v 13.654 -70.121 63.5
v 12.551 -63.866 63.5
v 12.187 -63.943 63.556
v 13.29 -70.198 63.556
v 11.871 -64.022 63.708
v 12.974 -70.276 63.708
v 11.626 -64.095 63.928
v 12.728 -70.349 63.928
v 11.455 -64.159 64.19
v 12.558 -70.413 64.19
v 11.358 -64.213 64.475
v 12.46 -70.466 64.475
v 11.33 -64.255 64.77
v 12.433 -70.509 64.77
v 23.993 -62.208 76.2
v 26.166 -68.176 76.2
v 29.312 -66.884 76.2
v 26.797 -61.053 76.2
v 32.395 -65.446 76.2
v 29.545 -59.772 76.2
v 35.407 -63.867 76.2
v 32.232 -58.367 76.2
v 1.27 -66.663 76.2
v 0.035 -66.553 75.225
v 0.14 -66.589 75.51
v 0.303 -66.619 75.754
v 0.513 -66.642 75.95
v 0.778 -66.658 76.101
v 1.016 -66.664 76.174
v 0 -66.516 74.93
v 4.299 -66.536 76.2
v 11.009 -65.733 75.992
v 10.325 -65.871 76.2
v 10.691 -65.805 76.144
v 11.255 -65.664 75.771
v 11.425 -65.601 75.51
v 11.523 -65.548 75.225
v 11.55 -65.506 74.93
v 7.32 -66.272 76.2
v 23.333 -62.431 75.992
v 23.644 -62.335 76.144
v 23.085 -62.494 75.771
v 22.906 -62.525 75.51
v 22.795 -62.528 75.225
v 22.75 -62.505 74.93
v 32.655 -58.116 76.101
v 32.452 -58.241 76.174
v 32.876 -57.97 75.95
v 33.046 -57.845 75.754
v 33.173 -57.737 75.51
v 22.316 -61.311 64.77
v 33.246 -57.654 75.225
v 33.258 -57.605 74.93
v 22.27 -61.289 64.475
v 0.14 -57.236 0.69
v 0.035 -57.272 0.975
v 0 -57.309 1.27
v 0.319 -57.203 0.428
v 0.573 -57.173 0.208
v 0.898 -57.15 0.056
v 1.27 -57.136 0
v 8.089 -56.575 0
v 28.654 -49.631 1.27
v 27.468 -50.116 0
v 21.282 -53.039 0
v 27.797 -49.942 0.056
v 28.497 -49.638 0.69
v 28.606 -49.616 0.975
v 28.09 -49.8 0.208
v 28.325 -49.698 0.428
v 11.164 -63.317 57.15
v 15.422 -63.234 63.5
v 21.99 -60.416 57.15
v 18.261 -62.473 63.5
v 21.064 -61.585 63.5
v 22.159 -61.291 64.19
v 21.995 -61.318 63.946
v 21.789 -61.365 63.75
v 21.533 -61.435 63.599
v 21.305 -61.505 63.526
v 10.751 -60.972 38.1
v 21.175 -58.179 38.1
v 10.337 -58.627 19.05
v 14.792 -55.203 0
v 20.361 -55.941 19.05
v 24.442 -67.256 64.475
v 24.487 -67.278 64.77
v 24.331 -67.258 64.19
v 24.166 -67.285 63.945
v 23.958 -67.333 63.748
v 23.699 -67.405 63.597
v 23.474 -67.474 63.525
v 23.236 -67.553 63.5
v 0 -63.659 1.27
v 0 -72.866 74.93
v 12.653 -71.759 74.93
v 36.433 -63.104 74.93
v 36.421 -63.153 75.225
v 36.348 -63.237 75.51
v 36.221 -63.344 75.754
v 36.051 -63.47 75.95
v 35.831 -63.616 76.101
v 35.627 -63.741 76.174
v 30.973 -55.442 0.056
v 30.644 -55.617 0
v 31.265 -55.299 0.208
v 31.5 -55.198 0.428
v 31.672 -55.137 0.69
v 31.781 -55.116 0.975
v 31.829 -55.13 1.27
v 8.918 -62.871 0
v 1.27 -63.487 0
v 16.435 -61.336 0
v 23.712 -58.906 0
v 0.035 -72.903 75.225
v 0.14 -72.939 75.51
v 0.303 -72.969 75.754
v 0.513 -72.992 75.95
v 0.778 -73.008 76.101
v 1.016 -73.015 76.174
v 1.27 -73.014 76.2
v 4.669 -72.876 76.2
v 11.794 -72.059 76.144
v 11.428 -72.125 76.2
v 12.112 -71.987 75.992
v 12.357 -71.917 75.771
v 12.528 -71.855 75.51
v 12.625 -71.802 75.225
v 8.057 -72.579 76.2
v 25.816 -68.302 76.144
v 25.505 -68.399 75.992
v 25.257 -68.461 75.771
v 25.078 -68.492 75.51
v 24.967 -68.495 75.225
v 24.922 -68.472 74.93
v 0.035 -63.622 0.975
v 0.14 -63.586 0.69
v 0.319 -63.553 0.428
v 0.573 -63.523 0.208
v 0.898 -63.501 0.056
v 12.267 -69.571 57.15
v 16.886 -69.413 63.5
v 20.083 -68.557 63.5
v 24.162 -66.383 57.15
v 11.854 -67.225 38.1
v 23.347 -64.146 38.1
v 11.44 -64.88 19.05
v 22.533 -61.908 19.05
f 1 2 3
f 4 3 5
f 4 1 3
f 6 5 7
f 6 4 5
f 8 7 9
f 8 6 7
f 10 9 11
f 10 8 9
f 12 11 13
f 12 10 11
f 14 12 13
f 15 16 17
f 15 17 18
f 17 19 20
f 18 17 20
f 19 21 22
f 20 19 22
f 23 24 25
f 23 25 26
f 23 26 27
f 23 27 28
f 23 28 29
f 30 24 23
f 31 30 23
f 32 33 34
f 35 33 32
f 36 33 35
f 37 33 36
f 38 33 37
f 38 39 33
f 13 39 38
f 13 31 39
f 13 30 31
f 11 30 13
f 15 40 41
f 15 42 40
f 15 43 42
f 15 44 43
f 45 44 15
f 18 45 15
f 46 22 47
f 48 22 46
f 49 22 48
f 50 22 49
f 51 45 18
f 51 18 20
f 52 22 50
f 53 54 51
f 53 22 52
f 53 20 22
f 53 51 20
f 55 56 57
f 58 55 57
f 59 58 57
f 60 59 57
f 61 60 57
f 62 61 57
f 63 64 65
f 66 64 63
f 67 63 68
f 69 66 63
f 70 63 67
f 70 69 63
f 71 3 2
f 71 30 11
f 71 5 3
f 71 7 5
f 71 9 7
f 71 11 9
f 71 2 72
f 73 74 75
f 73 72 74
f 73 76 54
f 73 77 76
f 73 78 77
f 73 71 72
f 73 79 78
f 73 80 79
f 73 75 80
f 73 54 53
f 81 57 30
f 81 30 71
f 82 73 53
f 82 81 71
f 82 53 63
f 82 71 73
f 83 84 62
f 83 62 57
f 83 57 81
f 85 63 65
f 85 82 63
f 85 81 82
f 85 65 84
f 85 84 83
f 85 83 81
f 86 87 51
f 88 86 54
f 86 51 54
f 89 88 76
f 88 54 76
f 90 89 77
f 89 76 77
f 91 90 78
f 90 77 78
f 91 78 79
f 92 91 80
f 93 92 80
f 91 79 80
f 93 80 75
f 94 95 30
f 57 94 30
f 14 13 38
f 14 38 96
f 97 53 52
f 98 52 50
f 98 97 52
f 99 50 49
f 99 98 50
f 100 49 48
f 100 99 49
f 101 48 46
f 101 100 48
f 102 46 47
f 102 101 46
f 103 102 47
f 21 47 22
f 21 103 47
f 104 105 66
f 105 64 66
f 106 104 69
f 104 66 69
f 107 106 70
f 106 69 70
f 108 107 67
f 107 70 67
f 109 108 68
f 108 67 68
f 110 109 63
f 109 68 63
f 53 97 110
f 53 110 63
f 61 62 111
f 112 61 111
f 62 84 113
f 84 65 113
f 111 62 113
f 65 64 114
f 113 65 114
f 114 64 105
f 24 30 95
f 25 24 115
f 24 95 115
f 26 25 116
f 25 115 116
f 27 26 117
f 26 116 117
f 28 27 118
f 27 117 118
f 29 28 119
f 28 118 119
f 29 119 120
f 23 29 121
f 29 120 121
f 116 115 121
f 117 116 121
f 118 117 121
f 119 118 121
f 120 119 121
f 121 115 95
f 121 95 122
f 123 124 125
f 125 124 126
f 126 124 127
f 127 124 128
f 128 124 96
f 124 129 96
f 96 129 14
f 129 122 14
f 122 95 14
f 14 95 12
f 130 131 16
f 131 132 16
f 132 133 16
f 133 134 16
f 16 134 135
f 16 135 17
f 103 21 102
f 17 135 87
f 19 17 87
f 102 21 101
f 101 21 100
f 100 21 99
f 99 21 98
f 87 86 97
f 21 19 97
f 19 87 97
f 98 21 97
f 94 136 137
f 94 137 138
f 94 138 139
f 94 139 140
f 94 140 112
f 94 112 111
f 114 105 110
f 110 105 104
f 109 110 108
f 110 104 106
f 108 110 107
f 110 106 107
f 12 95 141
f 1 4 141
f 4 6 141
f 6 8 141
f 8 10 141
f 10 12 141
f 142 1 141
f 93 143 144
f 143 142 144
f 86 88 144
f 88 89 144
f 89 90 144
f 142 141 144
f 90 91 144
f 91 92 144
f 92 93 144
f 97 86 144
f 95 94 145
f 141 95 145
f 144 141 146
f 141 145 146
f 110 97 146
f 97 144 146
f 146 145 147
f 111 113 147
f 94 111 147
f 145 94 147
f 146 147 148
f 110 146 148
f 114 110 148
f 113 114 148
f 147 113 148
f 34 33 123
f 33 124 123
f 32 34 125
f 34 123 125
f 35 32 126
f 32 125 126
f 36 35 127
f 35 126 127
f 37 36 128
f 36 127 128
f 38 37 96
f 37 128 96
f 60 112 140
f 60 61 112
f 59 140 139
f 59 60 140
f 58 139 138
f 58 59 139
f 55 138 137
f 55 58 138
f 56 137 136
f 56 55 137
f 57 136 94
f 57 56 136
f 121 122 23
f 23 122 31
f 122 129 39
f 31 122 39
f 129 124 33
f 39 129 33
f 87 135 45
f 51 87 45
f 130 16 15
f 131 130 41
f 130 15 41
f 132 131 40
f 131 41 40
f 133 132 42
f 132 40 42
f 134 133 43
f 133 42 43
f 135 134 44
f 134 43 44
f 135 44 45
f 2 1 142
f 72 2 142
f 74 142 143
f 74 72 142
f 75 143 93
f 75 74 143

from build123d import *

# Parameters (mm, degrees)
F2_ANGLE = 30
F7_DEPTH = 12.7
F8_R     = 1.27


with BuildPart() as f2:
    # F0 (on Right) → F2 (revolve)
    with BuildSketch(Plane.YZ):
        Polygon((-63.5, 0), (0, 0), (0, 25.4), (0, 50.8), (0, 76.2), (-73.025, 76.2), (-69.85, 50.8), (-66.675, 25.4), align=None)
    revolve(axis=Axis((0, 0, 0), (0, 0, 1)), revolution_arc=F2_ANGLE)

    # F3 (on Right) → F5 (revolve, cut)
    with BuildSketch(Plane.YZ):
        Polygon((-57.15, 0), (0, 0), (0, 25.4), (0, 50.8), (0, 76.2), (-66.675, 76.2), align=None)
    revolve(axis=Axis((0, 0, 0), (0, 0, 1)), mode=Mode.SUBTRACT)

    # F6 (on face) → F7 (cut)
    with BuildSketch(Plane.XY.offset(76.2)):
        with BuildLine():
            Line((24.9760209664, -68.6210536329), (0, 0))
            Line((0, 0), (12.6806581741, -71.9155861637))
            ThreePointArc((12.6806581741, -71.9155861637), (20.6260152492, -76.9773368677), (24.9760209664, -68.6210536329))
        make_face()
    extrude(amount=-F7_DEPTH, mode=Mode.SUBTRACT)

    # F8
    f8_edges = [f2.edges().sort_by_distance(p)[0] for p in [
        (12.129325, -68.788822, 76.2),
        (23.890107, -65.63753, 76.2),
        (34.925, -60.491874, 76.2),
        (30.1625, -52.242982, 0),
        (0, -60.325, 0),
        (0, -69.85, 76.2),
        (11.853659, -67.225439, 63.5),
        (23.34715, -64.145768, 63.5),
    ]]
    fillet(f8_edges, radius=F8_R)


solid = f2.part
